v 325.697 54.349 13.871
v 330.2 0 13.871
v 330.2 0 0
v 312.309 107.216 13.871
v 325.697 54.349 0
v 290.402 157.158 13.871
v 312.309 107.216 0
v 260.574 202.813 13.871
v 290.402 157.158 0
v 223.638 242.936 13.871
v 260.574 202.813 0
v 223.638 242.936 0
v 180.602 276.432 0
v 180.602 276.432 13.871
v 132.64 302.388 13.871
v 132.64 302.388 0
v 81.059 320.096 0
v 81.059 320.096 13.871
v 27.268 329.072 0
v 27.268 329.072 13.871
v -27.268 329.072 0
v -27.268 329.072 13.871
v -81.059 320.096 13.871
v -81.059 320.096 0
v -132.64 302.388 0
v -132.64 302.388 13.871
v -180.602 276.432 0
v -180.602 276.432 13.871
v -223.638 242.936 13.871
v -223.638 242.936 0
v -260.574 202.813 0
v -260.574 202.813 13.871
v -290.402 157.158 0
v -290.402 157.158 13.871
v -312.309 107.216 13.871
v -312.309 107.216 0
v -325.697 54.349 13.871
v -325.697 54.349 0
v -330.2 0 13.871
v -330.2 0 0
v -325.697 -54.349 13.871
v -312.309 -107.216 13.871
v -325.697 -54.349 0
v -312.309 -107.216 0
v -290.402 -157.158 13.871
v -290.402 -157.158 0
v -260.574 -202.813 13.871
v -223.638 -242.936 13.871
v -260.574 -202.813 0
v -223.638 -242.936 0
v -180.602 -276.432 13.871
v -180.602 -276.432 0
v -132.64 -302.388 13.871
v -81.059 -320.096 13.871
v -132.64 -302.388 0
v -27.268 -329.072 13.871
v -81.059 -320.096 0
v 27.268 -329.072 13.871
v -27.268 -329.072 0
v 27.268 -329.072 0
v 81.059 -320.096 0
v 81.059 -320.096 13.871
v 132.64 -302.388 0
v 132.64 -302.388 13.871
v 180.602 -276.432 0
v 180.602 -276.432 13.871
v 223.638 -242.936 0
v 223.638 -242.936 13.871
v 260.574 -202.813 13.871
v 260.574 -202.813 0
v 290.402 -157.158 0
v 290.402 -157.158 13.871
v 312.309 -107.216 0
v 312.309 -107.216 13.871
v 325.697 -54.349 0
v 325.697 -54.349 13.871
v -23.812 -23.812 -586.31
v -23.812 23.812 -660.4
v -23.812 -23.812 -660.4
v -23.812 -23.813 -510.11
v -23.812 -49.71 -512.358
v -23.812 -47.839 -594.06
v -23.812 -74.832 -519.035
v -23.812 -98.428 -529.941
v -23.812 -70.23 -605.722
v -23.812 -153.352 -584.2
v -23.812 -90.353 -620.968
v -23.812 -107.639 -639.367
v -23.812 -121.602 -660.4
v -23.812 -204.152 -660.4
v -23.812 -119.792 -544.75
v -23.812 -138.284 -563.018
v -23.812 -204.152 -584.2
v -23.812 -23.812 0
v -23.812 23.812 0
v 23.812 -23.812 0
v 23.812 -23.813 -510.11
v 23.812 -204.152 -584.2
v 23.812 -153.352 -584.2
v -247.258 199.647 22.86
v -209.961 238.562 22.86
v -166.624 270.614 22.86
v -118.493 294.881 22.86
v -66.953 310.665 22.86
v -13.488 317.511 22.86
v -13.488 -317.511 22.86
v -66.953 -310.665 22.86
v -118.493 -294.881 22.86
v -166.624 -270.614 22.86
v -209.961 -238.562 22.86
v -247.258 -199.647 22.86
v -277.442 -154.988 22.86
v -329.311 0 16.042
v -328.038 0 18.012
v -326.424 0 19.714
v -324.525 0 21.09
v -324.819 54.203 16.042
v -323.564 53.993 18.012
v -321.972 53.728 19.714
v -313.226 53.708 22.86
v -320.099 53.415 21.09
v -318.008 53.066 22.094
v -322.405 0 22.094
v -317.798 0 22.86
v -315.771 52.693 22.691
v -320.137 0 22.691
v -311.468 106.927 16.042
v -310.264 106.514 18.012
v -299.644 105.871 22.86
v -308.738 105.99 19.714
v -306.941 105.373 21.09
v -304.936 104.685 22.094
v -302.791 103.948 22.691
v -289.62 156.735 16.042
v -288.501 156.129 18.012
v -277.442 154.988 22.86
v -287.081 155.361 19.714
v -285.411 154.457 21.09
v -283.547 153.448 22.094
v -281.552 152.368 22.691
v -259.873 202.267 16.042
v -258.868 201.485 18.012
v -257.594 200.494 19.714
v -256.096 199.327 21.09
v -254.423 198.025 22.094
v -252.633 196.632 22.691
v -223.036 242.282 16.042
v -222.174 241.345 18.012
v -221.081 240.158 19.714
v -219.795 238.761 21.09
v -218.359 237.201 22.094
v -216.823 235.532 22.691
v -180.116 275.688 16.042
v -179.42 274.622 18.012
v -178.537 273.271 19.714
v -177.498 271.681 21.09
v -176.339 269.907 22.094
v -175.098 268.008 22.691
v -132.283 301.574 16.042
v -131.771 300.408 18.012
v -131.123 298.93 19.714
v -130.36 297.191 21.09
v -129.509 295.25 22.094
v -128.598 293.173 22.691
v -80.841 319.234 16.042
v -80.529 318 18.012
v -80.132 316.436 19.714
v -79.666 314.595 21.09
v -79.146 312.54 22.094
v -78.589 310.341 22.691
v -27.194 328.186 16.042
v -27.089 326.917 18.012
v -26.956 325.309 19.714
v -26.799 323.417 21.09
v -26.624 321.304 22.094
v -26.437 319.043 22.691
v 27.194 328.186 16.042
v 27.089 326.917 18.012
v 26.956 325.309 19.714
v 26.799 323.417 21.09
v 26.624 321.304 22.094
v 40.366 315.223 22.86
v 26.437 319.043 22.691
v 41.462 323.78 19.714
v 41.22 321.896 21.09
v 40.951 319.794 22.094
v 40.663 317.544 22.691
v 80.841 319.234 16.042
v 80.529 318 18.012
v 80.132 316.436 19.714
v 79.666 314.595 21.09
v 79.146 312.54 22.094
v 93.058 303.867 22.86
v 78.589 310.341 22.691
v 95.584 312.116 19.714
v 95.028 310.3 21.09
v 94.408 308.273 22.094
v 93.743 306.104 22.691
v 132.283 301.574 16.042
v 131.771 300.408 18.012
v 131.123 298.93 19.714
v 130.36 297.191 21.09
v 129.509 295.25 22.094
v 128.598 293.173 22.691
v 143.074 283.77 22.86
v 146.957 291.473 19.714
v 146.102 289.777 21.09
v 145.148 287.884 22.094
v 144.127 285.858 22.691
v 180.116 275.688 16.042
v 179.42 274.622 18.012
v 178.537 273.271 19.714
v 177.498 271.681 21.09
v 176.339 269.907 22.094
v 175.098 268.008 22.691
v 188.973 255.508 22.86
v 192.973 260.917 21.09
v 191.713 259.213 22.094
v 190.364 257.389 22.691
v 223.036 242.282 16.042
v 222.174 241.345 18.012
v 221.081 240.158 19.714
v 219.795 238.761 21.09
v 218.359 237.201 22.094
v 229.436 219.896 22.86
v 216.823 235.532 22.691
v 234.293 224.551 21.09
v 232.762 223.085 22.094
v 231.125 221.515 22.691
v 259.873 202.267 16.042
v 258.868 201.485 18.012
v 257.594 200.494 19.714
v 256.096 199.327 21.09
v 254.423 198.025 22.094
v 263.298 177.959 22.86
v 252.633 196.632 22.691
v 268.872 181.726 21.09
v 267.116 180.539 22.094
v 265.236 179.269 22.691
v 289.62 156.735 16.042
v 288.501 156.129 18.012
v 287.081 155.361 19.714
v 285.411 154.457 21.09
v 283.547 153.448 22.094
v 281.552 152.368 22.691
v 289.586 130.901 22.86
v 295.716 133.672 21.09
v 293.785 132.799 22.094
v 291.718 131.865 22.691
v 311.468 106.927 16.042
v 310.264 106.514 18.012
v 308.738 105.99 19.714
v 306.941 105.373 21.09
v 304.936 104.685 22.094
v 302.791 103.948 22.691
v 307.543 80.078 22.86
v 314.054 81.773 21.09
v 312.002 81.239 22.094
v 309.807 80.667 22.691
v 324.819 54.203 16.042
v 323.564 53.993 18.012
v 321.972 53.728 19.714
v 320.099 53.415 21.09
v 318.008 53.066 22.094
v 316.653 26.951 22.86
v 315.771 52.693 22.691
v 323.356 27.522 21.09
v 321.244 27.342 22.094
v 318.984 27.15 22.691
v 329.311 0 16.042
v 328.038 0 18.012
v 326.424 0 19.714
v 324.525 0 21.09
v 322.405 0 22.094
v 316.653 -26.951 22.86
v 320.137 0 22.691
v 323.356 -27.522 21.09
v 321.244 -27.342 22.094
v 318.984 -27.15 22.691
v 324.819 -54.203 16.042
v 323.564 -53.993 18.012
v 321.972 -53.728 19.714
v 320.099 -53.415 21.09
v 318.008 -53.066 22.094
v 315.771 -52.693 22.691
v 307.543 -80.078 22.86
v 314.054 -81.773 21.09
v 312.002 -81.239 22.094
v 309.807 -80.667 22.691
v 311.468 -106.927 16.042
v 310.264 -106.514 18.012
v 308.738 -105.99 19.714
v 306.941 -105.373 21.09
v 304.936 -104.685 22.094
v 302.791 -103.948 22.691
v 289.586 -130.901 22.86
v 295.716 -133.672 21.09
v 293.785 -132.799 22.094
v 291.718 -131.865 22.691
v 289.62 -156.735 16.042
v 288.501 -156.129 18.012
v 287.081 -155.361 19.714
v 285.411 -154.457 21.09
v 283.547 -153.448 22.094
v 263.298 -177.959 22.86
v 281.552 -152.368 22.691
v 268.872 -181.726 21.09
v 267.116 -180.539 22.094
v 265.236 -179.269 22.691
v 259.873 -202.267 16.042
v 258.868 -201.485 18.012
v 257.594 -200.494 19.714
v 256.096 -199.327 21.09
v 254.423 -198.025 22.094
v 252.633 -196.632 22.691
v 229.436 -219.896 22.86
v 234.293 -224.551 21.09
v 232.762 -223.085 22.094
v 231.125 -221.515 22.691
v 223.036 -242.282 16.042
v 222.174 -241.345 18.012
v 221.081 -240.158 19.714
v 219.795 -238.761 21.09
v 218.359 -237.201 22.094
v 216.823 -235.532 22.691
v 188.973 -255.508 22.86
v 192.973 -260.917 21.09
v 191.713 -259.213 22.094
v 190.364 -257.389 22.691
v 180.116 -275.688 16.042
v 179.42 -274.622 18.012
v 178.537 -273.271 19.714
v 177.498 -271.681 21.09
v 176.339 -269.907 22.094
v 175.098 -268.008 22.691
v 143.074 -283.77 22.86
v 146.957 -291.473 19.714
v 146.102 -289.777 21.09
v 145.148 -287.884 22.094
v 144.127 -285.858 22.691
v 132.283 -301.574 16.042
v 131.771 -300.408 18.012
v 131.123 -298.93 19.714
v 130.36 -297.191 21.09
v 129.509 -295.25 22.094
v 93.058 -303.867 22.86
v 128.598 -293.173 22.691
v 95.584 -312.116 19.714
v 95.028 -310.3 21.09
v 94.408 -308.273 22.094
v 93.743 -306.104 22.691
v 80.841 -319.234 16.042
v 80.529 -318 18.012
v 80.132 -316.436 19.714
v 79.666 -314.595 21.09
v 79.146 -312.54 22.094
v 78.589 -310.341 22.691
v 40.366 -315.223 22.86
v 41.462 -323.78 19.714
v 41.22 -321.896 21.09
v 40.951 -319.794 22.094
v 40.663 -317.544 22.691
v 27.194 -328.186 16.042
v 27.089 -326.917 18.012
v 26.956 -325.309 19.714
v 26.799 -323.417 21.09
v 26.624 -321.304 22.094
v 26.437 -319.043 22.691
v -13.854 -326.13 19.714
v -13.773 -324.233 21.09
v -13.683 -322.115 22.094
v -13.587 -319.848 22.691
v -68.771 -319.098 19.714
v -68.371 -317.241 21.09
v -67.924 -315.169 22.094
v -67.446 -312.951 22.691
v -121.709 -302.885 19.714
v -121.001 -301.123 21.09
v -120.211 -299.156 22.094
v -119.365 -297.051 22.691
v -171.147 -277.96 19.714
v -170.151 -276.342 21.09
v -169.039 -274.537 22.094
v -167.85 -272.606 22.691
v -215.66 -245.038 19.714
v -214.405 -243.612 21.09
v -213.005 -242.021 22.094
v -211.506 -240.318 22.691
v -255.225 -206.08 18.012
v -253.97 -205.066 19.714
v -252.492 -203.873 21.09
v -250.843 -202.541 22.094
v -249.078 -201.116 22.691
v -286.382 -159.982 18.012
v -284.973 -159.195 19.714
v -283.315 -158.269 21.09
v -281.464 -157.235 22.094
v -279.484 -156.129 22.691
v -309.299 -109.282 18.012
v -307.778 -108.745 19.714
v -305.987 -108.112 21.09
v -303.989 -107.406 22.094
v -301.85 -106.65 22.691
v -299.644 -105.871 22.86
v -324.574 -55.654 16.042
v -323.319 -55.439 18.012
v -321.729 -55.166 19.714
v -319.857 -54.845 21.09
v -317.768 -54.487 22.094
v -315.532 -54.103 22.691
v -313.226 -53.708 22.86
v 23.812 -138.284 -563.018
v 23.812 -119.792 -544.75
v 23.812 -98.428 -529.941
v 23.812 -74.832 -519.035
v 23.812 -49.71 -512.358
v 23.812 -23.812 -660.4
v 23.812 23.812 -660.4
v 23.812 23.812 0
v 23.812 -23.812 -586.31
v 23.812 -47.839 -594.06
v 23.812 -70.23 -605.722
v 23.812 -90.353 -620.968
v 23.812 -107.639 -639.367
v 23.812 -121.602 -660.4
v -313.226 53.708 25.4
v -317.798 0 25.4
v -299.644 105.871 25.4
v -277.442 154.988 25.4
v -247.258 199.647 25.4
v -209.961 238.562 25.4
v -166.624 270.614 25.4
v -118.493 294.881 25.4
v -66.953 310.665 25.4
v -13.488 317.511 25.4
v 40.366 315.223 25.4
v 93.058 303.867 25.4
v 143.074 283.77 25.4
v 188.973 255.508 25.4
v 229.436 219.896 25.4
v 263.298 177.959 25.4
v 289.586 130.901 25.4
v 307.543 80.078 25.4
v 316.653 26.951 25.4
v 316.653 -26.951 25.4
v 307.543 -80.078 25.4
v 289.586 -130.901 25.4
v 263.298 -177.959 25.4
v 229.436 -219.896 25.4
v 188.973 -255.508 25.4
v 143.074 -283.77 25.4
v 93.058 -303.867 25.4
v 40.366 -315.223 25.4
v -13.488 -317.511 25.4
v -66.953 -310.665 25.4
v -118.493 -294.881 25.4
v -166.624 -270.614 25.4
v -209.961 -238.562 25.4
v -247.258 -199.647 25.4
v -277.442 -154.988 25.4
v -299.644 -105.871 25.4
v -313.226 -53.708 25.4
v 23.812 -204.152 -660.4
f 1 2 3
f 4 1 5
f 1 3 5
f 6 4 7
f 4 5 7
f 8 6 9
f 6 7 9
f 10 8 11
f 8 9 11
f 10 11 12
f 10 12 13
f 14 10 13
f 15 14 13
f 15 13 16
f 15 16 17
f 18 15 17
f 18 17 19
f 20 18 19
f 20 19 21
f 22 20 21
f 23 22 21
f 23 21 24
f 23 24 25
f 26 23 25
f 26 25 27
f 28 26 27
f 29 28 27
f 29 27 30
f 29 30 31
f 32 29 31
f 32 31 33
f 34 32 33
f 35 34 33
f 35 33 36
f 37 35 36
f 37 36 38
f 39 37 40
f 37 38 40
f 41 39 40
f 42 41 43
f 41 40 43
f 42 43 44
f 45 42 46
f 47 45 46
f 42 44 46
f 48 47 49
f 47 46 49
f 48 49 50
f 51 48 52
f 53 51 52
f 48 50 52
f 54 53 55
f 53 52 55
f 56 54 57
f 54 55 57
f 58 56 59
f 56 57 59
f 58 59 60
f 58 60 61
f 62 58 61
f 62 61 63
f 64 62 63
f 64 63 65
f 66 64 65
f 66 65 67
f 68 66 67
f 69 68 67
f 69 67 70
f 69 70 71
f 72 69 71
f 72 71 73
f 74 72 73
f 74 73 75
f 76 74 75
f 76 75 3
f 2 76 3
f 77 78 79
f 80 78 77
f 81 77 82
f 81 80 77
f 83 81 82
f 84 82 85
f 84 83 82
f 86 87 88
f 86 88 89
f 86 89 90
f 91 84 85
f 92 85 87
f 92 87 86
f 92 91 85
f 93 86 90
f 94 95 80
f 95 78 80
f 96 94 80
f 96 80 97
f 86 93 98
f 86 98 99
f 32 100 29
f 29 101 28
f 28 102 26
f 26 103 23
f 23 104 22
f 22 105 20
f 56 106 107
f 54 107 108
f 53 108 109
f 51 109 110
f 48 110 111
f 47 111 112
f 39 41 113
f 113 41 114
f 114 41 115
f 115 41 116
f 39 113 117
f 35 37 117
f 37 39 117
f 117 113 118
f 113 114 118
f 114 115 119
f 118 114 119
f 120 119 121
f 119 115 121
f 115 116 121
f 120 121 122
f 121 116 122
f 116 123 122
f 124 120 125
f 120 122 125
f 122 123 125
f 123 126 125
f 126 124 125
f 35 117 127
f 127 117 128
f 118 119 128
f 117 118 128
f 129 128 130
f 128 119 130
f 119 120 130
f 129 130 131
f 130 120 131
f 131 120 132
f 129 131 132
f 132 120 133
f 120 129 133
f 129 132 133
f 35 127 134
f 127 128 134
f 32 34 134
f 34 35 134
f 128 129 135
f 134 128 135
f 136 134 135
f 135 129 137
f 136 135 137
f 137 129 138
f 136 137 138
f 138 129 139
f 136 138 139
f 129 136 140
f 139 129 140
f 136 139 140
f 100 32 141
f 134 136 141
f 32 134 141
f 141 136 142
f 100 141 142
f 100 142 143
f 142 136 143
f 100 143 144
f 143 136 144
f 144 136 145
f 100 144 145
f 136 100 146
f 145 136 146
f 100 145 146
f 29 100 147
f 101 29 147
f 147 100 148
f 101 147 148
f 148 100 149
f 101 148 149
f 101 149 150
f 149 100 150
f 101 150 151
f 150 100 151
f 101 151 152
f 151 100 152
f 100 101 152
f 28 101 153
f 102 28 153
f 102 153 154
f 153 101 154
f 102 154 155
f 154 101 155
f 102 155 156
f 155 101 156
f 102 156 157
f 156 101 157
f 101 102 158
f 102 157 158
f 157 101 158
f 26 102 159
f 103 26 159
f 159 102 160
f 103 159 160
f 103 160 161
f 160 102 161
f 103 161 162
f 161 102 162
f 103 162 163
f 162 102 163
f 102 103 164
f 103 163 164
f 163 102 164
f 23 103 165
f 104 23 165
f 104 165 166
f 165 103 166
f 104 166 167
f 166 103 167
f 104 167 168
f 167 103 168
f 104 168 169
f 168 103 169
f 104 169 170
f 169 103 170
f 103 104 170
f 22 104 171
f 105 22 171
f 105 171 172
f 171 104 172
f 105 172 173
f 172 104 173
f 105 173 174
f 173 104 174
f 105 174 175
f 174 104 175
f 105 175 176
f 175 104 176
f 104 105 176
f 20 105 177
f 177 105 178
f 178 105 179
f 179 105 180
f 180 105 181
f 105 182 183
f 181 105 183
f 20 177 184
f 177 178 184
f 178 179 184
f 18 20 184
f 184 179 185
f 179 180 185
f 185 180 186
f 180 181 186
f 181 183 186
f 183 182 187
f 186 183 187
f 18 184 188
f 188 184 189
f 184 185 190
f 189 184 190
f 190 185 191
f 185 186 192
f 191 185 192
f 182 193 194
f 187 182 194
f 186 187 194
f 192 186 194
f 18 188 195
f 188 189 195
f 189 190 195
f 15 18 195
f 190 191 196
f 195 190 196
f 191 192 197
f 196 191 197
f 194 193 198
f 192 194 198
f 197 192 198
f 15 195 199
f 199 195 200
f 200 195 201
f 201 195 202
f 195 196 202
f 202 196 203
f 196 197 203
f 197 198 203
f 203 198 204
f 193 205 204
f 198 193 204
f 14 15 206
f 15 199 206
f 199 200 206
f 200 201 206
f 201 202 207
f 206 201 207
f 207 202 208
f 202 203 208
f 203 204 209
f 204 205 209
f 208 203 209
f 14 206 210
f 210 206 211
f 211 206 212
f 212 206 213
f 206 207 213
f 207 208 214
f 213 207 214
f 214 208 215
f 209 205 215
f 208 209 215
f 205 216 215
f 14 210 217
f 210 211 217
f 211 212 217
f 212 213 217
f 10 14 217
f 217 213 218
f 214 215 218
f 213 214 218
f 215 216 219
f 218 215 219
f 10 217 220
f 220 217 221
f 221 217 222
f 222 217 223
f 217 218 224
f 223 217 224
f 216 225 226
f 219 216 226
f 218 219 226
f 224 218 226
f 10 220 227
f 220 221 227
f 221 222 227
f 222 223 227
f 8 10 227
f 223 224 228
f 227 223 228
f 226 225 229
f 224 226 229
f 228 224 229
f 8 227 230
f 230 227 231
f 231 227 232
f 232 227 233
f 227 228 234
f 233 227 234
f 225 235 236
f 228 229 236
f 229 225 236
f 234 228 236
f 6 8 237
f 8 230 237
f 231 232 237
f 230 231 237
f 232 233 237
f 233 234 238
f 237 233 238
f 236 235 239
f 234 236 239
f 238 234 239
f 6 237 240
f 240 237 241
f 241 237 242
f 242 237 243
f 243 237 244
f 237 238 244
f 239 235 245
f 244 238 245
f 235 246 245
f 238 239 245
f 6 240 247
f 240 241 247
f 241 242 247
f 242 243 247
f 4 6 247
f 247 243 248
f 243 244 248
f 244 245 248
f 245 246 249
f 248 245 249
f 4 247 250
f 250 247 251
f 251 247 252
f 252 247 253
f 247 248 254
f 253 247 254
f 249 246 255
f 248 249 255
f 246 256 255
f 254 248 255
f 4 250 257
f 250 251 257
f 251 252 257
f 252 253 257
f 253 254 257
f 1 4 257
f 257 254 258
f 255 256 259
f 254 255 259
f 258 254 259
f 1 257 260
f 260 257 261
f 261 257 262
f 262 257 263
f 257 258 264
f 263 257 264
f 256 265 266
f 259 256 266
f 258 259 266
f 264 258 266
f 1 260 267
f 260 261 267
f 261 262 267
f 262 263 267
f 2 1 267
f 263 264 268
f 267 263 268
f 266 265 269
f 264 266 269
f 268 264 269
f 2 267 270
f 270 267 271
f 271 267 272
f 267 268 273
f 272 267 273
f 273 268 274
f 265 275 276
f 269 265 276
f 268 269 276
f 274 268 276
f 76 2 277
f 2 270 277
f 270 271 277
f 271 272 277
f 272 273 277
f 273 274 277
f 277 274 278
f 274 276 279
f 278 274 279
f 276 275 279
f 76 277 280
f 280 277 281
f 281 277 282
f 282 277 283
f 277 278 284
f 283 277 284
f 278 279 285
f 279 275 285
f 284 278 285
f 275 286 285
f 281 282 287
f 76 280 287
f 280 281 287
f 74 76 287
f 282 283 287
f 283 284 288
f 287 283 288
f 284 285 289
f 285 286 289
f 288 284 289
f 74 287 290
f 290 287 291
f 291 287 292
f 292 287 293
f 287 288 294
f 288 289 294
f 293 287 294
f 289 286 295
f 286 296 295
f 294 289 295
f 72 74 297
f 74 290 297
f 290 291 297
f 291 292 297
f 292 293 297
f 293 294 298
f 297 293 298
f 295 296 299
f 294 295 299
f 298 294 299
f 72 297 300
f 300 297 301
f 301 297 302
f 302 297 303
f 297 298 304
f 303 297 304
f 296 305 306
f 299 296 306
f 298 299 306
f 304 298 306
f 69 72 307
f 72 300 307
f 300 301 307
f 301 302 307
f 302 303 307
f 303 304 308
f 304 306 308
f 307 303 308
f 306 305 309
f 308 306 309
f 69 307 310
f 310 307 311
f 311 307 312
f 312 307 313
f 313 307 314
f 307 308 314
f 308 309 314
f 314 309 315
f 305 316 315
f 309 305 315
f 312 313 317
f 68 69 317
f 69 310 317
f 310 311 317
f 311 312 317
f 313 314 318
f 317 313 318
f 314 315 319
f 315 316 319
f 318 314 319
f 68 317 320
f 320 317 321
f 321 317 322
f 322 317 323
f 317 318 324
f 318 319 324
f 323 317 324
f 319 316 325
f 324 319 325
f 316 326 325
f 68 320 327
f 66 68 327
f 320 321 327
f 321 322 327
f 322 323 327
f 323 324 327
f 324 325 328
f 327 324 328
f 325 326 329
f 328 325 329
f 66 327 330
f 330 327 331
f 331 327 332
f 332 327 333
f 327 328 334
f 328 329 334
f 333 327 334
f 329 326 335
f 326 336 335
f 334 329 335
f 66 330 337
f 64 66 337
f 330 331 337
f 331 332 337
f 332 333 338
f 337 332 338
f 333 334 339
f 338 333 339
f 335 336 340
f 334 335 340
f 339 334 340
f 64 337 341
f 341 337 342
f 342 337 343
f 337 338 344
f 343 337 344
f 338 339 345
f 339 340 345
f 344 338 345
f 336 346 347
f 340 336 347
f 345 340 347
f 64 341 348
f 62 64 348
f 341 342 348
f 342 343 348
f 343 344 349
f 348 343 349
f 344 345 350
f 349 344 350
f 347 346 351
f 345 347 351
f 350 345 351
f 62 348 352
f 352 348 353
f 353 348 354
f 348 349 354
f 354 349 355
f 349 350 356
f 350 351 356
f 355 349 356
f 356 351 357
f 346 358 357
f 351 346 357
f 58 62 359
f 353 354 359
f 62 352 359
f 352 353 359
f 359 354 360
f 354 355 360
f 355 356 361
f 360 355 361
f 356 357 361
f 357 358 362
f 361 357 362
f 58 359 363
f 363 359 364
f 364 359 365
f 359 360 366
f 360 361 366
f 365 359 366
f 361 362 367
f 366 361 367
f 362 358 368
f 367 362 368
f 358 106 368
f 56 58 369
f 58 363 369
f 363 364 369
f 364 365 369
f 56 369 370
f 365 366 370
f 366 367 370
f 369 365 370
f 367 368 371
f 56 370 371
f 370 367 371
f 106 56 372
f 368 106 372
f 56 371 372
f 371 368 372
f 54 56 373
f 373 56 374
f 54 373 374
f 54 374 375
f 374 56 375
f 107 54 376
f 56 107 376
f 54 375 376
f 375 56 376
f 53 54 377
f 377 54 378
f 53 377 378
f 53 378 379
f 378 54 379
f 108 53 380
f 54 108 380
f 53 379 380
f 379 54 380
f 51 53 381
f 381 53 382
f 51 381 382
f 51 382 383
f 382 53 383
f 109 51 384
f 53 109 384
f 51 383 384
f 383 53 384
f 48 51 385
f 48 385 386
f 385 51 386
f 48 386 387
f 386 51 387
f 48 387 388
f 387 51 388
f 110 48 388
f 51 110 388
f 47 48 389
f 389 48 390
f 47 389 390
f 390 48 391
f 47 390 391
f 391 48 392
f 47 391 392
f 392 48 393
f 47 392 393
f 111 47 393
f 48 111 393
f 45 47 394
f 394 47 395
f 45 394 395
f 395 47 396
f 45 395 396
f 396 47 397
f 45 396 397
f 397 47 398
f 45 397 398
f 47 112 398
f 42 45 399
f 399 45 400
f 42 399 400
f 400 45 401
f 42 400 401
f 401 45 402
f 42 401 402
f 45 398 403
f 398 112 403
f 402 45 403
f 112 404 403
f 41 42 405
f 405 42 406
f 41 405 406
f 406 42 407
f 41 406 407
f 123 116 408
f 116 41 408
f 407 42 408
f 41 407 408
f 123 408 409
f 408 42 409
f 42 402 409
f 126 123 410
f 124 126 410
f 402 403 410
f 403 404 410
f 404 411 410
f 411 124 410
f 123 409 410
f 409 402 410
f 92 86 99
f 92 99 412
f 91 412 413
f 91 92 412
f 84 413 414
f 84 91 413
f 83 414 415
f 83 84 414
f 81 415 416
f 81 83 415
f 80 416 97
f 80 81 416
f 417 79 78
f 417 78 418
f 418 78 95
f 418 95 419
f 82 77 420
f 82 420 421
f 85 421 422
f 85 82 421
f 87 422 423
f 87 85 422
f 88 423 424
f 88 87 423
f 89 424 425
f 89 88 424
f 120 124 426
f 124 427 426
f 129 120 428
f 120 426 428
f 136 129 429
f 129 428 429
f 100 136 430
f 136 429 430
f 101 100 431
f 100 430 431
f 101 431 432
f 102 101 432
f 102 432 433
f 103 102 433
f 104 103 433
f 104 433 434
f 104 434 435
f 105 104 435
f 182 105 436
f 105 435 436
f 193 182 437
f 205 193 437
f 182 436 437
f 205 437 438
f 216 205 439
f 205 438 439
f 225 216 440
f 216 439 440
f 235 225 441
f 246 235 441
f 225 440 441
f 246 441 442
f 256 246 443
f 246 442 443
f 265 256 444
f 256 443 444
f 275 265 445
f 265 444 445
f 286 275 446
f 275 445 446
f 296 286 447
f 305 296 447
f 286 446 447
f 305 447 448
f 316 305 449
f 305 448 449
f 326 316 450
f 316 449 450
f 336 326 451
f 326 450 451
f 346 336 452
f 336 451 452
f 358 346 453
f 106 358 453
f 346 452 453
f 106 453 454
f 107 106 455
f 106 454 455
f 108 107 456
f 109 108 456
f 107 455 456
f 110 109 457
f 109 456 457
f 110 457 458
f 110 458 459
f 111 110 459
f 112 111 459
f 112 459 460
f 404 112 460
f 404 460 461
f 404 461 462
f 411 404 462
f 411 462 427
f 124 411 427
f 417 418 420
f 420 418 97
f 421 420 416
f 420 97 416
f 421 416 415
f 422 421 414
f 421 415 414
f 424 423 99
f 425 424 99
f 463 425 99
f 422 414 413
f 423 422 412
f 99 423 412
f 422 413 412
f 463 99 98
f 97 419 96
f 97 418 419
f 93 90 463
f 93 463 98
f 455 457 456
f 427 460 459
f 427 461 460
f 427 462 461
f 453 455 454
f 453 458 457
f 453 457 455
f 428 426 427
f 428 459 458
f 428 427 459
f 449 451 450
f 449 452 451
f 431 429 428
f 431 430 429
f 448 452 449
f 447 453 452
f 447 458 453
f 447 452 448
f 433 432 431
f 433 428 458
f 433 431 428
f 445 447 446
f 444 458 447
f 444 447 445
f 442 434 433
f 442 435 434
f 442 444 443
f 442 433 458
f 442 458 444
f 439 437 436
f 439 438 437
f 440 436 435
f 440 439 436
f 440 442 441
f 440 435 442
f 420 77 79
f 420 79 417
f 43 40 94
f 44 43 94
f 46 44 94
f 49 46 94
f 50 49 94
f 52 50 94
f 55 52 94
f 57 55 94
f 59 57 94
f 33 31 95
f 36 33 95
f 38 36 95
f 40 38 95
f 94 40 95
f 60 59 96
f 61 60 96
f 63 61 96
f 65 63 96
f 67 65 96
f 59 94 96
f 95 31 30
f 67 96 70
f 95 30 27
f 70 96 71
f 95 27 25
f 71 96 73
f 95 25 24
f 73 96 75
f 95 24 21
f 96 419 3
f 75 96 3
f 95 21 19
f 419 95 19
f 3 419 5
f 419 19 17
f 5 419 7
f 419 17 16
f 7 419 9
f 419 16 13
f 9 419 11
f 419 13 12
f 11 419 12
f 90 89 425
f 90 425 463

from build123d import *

# Parameters (mm, degrees)
F0_R     = 330.2
F1_DEPTH = 25.4
F4_W     = 47.625
F4_H     = 47.625
F5_DEPTH = 660.4
F7_DEPTH = 47.625


with BuildPart() as f1:
    # F0 (on Top) → F1 (new body)
    with BuildSketch(Plane.XY):
        Circle(F0_R)
    extrude(amount=F1_DEPTH)

    # F2 (on Front) → F3 (revolve, cut)
    with BuildSketch(Plane.XZ):
        with BuildLine():
            Line((-317.797519, 22.86), (-317.797519, 25.4))
            Line((-317.797519, 25.4), (-330.497519, 25.4))
            Line((-330.497519, 25.4), (-330.497519, 12.7))
            ThreePointArc((-330.497519, 12.7), (-325.987211, 20.079616), (-317.797519, 22.86))
        make_face()
    revolve(axis=Axis((0, 0, -14.905058), (0, 0, -1)), mode=Mode.SUBTRACT)

    # F4 (on face) → F5 (join)
    with BuildSketch(Plane(origin=(0, 0, 0), x_dir=(1, 0, 0), z_dir=(0, 0, -1))):
        Rectangle(F4_W, F4_H)
    extrude(amount=F5_DEPTH)

    # F6 (on face) → F7 (join)
    with BuildSketch(Plane(origin=(-23.8125, 0, 0), x_dir=(0, -1, 0), z_dir=(-1, 0, 0))):
        with BuildLine():
            Line((204.1525, -584.2), (153.3525, -584.2))
            ThreePointArc((153.3525, -584.2), (98.428054, -529.940923), (23.8125, -510.110108))
            Line((23.8125, -510.110108), (23.8125, -586.310108))
            ThreePointArc((23.8125, -586.310108), (80.612019, -612.922013), (121.6025, -660.4))
            Line((121.6025, -660.4), (204.1525, -660.4))
            Line((204.1525, -660.4), (204.1525, -584.2))
        make_face()
    extrude(amount=-F7_DEPTH)


solid = f1.part
